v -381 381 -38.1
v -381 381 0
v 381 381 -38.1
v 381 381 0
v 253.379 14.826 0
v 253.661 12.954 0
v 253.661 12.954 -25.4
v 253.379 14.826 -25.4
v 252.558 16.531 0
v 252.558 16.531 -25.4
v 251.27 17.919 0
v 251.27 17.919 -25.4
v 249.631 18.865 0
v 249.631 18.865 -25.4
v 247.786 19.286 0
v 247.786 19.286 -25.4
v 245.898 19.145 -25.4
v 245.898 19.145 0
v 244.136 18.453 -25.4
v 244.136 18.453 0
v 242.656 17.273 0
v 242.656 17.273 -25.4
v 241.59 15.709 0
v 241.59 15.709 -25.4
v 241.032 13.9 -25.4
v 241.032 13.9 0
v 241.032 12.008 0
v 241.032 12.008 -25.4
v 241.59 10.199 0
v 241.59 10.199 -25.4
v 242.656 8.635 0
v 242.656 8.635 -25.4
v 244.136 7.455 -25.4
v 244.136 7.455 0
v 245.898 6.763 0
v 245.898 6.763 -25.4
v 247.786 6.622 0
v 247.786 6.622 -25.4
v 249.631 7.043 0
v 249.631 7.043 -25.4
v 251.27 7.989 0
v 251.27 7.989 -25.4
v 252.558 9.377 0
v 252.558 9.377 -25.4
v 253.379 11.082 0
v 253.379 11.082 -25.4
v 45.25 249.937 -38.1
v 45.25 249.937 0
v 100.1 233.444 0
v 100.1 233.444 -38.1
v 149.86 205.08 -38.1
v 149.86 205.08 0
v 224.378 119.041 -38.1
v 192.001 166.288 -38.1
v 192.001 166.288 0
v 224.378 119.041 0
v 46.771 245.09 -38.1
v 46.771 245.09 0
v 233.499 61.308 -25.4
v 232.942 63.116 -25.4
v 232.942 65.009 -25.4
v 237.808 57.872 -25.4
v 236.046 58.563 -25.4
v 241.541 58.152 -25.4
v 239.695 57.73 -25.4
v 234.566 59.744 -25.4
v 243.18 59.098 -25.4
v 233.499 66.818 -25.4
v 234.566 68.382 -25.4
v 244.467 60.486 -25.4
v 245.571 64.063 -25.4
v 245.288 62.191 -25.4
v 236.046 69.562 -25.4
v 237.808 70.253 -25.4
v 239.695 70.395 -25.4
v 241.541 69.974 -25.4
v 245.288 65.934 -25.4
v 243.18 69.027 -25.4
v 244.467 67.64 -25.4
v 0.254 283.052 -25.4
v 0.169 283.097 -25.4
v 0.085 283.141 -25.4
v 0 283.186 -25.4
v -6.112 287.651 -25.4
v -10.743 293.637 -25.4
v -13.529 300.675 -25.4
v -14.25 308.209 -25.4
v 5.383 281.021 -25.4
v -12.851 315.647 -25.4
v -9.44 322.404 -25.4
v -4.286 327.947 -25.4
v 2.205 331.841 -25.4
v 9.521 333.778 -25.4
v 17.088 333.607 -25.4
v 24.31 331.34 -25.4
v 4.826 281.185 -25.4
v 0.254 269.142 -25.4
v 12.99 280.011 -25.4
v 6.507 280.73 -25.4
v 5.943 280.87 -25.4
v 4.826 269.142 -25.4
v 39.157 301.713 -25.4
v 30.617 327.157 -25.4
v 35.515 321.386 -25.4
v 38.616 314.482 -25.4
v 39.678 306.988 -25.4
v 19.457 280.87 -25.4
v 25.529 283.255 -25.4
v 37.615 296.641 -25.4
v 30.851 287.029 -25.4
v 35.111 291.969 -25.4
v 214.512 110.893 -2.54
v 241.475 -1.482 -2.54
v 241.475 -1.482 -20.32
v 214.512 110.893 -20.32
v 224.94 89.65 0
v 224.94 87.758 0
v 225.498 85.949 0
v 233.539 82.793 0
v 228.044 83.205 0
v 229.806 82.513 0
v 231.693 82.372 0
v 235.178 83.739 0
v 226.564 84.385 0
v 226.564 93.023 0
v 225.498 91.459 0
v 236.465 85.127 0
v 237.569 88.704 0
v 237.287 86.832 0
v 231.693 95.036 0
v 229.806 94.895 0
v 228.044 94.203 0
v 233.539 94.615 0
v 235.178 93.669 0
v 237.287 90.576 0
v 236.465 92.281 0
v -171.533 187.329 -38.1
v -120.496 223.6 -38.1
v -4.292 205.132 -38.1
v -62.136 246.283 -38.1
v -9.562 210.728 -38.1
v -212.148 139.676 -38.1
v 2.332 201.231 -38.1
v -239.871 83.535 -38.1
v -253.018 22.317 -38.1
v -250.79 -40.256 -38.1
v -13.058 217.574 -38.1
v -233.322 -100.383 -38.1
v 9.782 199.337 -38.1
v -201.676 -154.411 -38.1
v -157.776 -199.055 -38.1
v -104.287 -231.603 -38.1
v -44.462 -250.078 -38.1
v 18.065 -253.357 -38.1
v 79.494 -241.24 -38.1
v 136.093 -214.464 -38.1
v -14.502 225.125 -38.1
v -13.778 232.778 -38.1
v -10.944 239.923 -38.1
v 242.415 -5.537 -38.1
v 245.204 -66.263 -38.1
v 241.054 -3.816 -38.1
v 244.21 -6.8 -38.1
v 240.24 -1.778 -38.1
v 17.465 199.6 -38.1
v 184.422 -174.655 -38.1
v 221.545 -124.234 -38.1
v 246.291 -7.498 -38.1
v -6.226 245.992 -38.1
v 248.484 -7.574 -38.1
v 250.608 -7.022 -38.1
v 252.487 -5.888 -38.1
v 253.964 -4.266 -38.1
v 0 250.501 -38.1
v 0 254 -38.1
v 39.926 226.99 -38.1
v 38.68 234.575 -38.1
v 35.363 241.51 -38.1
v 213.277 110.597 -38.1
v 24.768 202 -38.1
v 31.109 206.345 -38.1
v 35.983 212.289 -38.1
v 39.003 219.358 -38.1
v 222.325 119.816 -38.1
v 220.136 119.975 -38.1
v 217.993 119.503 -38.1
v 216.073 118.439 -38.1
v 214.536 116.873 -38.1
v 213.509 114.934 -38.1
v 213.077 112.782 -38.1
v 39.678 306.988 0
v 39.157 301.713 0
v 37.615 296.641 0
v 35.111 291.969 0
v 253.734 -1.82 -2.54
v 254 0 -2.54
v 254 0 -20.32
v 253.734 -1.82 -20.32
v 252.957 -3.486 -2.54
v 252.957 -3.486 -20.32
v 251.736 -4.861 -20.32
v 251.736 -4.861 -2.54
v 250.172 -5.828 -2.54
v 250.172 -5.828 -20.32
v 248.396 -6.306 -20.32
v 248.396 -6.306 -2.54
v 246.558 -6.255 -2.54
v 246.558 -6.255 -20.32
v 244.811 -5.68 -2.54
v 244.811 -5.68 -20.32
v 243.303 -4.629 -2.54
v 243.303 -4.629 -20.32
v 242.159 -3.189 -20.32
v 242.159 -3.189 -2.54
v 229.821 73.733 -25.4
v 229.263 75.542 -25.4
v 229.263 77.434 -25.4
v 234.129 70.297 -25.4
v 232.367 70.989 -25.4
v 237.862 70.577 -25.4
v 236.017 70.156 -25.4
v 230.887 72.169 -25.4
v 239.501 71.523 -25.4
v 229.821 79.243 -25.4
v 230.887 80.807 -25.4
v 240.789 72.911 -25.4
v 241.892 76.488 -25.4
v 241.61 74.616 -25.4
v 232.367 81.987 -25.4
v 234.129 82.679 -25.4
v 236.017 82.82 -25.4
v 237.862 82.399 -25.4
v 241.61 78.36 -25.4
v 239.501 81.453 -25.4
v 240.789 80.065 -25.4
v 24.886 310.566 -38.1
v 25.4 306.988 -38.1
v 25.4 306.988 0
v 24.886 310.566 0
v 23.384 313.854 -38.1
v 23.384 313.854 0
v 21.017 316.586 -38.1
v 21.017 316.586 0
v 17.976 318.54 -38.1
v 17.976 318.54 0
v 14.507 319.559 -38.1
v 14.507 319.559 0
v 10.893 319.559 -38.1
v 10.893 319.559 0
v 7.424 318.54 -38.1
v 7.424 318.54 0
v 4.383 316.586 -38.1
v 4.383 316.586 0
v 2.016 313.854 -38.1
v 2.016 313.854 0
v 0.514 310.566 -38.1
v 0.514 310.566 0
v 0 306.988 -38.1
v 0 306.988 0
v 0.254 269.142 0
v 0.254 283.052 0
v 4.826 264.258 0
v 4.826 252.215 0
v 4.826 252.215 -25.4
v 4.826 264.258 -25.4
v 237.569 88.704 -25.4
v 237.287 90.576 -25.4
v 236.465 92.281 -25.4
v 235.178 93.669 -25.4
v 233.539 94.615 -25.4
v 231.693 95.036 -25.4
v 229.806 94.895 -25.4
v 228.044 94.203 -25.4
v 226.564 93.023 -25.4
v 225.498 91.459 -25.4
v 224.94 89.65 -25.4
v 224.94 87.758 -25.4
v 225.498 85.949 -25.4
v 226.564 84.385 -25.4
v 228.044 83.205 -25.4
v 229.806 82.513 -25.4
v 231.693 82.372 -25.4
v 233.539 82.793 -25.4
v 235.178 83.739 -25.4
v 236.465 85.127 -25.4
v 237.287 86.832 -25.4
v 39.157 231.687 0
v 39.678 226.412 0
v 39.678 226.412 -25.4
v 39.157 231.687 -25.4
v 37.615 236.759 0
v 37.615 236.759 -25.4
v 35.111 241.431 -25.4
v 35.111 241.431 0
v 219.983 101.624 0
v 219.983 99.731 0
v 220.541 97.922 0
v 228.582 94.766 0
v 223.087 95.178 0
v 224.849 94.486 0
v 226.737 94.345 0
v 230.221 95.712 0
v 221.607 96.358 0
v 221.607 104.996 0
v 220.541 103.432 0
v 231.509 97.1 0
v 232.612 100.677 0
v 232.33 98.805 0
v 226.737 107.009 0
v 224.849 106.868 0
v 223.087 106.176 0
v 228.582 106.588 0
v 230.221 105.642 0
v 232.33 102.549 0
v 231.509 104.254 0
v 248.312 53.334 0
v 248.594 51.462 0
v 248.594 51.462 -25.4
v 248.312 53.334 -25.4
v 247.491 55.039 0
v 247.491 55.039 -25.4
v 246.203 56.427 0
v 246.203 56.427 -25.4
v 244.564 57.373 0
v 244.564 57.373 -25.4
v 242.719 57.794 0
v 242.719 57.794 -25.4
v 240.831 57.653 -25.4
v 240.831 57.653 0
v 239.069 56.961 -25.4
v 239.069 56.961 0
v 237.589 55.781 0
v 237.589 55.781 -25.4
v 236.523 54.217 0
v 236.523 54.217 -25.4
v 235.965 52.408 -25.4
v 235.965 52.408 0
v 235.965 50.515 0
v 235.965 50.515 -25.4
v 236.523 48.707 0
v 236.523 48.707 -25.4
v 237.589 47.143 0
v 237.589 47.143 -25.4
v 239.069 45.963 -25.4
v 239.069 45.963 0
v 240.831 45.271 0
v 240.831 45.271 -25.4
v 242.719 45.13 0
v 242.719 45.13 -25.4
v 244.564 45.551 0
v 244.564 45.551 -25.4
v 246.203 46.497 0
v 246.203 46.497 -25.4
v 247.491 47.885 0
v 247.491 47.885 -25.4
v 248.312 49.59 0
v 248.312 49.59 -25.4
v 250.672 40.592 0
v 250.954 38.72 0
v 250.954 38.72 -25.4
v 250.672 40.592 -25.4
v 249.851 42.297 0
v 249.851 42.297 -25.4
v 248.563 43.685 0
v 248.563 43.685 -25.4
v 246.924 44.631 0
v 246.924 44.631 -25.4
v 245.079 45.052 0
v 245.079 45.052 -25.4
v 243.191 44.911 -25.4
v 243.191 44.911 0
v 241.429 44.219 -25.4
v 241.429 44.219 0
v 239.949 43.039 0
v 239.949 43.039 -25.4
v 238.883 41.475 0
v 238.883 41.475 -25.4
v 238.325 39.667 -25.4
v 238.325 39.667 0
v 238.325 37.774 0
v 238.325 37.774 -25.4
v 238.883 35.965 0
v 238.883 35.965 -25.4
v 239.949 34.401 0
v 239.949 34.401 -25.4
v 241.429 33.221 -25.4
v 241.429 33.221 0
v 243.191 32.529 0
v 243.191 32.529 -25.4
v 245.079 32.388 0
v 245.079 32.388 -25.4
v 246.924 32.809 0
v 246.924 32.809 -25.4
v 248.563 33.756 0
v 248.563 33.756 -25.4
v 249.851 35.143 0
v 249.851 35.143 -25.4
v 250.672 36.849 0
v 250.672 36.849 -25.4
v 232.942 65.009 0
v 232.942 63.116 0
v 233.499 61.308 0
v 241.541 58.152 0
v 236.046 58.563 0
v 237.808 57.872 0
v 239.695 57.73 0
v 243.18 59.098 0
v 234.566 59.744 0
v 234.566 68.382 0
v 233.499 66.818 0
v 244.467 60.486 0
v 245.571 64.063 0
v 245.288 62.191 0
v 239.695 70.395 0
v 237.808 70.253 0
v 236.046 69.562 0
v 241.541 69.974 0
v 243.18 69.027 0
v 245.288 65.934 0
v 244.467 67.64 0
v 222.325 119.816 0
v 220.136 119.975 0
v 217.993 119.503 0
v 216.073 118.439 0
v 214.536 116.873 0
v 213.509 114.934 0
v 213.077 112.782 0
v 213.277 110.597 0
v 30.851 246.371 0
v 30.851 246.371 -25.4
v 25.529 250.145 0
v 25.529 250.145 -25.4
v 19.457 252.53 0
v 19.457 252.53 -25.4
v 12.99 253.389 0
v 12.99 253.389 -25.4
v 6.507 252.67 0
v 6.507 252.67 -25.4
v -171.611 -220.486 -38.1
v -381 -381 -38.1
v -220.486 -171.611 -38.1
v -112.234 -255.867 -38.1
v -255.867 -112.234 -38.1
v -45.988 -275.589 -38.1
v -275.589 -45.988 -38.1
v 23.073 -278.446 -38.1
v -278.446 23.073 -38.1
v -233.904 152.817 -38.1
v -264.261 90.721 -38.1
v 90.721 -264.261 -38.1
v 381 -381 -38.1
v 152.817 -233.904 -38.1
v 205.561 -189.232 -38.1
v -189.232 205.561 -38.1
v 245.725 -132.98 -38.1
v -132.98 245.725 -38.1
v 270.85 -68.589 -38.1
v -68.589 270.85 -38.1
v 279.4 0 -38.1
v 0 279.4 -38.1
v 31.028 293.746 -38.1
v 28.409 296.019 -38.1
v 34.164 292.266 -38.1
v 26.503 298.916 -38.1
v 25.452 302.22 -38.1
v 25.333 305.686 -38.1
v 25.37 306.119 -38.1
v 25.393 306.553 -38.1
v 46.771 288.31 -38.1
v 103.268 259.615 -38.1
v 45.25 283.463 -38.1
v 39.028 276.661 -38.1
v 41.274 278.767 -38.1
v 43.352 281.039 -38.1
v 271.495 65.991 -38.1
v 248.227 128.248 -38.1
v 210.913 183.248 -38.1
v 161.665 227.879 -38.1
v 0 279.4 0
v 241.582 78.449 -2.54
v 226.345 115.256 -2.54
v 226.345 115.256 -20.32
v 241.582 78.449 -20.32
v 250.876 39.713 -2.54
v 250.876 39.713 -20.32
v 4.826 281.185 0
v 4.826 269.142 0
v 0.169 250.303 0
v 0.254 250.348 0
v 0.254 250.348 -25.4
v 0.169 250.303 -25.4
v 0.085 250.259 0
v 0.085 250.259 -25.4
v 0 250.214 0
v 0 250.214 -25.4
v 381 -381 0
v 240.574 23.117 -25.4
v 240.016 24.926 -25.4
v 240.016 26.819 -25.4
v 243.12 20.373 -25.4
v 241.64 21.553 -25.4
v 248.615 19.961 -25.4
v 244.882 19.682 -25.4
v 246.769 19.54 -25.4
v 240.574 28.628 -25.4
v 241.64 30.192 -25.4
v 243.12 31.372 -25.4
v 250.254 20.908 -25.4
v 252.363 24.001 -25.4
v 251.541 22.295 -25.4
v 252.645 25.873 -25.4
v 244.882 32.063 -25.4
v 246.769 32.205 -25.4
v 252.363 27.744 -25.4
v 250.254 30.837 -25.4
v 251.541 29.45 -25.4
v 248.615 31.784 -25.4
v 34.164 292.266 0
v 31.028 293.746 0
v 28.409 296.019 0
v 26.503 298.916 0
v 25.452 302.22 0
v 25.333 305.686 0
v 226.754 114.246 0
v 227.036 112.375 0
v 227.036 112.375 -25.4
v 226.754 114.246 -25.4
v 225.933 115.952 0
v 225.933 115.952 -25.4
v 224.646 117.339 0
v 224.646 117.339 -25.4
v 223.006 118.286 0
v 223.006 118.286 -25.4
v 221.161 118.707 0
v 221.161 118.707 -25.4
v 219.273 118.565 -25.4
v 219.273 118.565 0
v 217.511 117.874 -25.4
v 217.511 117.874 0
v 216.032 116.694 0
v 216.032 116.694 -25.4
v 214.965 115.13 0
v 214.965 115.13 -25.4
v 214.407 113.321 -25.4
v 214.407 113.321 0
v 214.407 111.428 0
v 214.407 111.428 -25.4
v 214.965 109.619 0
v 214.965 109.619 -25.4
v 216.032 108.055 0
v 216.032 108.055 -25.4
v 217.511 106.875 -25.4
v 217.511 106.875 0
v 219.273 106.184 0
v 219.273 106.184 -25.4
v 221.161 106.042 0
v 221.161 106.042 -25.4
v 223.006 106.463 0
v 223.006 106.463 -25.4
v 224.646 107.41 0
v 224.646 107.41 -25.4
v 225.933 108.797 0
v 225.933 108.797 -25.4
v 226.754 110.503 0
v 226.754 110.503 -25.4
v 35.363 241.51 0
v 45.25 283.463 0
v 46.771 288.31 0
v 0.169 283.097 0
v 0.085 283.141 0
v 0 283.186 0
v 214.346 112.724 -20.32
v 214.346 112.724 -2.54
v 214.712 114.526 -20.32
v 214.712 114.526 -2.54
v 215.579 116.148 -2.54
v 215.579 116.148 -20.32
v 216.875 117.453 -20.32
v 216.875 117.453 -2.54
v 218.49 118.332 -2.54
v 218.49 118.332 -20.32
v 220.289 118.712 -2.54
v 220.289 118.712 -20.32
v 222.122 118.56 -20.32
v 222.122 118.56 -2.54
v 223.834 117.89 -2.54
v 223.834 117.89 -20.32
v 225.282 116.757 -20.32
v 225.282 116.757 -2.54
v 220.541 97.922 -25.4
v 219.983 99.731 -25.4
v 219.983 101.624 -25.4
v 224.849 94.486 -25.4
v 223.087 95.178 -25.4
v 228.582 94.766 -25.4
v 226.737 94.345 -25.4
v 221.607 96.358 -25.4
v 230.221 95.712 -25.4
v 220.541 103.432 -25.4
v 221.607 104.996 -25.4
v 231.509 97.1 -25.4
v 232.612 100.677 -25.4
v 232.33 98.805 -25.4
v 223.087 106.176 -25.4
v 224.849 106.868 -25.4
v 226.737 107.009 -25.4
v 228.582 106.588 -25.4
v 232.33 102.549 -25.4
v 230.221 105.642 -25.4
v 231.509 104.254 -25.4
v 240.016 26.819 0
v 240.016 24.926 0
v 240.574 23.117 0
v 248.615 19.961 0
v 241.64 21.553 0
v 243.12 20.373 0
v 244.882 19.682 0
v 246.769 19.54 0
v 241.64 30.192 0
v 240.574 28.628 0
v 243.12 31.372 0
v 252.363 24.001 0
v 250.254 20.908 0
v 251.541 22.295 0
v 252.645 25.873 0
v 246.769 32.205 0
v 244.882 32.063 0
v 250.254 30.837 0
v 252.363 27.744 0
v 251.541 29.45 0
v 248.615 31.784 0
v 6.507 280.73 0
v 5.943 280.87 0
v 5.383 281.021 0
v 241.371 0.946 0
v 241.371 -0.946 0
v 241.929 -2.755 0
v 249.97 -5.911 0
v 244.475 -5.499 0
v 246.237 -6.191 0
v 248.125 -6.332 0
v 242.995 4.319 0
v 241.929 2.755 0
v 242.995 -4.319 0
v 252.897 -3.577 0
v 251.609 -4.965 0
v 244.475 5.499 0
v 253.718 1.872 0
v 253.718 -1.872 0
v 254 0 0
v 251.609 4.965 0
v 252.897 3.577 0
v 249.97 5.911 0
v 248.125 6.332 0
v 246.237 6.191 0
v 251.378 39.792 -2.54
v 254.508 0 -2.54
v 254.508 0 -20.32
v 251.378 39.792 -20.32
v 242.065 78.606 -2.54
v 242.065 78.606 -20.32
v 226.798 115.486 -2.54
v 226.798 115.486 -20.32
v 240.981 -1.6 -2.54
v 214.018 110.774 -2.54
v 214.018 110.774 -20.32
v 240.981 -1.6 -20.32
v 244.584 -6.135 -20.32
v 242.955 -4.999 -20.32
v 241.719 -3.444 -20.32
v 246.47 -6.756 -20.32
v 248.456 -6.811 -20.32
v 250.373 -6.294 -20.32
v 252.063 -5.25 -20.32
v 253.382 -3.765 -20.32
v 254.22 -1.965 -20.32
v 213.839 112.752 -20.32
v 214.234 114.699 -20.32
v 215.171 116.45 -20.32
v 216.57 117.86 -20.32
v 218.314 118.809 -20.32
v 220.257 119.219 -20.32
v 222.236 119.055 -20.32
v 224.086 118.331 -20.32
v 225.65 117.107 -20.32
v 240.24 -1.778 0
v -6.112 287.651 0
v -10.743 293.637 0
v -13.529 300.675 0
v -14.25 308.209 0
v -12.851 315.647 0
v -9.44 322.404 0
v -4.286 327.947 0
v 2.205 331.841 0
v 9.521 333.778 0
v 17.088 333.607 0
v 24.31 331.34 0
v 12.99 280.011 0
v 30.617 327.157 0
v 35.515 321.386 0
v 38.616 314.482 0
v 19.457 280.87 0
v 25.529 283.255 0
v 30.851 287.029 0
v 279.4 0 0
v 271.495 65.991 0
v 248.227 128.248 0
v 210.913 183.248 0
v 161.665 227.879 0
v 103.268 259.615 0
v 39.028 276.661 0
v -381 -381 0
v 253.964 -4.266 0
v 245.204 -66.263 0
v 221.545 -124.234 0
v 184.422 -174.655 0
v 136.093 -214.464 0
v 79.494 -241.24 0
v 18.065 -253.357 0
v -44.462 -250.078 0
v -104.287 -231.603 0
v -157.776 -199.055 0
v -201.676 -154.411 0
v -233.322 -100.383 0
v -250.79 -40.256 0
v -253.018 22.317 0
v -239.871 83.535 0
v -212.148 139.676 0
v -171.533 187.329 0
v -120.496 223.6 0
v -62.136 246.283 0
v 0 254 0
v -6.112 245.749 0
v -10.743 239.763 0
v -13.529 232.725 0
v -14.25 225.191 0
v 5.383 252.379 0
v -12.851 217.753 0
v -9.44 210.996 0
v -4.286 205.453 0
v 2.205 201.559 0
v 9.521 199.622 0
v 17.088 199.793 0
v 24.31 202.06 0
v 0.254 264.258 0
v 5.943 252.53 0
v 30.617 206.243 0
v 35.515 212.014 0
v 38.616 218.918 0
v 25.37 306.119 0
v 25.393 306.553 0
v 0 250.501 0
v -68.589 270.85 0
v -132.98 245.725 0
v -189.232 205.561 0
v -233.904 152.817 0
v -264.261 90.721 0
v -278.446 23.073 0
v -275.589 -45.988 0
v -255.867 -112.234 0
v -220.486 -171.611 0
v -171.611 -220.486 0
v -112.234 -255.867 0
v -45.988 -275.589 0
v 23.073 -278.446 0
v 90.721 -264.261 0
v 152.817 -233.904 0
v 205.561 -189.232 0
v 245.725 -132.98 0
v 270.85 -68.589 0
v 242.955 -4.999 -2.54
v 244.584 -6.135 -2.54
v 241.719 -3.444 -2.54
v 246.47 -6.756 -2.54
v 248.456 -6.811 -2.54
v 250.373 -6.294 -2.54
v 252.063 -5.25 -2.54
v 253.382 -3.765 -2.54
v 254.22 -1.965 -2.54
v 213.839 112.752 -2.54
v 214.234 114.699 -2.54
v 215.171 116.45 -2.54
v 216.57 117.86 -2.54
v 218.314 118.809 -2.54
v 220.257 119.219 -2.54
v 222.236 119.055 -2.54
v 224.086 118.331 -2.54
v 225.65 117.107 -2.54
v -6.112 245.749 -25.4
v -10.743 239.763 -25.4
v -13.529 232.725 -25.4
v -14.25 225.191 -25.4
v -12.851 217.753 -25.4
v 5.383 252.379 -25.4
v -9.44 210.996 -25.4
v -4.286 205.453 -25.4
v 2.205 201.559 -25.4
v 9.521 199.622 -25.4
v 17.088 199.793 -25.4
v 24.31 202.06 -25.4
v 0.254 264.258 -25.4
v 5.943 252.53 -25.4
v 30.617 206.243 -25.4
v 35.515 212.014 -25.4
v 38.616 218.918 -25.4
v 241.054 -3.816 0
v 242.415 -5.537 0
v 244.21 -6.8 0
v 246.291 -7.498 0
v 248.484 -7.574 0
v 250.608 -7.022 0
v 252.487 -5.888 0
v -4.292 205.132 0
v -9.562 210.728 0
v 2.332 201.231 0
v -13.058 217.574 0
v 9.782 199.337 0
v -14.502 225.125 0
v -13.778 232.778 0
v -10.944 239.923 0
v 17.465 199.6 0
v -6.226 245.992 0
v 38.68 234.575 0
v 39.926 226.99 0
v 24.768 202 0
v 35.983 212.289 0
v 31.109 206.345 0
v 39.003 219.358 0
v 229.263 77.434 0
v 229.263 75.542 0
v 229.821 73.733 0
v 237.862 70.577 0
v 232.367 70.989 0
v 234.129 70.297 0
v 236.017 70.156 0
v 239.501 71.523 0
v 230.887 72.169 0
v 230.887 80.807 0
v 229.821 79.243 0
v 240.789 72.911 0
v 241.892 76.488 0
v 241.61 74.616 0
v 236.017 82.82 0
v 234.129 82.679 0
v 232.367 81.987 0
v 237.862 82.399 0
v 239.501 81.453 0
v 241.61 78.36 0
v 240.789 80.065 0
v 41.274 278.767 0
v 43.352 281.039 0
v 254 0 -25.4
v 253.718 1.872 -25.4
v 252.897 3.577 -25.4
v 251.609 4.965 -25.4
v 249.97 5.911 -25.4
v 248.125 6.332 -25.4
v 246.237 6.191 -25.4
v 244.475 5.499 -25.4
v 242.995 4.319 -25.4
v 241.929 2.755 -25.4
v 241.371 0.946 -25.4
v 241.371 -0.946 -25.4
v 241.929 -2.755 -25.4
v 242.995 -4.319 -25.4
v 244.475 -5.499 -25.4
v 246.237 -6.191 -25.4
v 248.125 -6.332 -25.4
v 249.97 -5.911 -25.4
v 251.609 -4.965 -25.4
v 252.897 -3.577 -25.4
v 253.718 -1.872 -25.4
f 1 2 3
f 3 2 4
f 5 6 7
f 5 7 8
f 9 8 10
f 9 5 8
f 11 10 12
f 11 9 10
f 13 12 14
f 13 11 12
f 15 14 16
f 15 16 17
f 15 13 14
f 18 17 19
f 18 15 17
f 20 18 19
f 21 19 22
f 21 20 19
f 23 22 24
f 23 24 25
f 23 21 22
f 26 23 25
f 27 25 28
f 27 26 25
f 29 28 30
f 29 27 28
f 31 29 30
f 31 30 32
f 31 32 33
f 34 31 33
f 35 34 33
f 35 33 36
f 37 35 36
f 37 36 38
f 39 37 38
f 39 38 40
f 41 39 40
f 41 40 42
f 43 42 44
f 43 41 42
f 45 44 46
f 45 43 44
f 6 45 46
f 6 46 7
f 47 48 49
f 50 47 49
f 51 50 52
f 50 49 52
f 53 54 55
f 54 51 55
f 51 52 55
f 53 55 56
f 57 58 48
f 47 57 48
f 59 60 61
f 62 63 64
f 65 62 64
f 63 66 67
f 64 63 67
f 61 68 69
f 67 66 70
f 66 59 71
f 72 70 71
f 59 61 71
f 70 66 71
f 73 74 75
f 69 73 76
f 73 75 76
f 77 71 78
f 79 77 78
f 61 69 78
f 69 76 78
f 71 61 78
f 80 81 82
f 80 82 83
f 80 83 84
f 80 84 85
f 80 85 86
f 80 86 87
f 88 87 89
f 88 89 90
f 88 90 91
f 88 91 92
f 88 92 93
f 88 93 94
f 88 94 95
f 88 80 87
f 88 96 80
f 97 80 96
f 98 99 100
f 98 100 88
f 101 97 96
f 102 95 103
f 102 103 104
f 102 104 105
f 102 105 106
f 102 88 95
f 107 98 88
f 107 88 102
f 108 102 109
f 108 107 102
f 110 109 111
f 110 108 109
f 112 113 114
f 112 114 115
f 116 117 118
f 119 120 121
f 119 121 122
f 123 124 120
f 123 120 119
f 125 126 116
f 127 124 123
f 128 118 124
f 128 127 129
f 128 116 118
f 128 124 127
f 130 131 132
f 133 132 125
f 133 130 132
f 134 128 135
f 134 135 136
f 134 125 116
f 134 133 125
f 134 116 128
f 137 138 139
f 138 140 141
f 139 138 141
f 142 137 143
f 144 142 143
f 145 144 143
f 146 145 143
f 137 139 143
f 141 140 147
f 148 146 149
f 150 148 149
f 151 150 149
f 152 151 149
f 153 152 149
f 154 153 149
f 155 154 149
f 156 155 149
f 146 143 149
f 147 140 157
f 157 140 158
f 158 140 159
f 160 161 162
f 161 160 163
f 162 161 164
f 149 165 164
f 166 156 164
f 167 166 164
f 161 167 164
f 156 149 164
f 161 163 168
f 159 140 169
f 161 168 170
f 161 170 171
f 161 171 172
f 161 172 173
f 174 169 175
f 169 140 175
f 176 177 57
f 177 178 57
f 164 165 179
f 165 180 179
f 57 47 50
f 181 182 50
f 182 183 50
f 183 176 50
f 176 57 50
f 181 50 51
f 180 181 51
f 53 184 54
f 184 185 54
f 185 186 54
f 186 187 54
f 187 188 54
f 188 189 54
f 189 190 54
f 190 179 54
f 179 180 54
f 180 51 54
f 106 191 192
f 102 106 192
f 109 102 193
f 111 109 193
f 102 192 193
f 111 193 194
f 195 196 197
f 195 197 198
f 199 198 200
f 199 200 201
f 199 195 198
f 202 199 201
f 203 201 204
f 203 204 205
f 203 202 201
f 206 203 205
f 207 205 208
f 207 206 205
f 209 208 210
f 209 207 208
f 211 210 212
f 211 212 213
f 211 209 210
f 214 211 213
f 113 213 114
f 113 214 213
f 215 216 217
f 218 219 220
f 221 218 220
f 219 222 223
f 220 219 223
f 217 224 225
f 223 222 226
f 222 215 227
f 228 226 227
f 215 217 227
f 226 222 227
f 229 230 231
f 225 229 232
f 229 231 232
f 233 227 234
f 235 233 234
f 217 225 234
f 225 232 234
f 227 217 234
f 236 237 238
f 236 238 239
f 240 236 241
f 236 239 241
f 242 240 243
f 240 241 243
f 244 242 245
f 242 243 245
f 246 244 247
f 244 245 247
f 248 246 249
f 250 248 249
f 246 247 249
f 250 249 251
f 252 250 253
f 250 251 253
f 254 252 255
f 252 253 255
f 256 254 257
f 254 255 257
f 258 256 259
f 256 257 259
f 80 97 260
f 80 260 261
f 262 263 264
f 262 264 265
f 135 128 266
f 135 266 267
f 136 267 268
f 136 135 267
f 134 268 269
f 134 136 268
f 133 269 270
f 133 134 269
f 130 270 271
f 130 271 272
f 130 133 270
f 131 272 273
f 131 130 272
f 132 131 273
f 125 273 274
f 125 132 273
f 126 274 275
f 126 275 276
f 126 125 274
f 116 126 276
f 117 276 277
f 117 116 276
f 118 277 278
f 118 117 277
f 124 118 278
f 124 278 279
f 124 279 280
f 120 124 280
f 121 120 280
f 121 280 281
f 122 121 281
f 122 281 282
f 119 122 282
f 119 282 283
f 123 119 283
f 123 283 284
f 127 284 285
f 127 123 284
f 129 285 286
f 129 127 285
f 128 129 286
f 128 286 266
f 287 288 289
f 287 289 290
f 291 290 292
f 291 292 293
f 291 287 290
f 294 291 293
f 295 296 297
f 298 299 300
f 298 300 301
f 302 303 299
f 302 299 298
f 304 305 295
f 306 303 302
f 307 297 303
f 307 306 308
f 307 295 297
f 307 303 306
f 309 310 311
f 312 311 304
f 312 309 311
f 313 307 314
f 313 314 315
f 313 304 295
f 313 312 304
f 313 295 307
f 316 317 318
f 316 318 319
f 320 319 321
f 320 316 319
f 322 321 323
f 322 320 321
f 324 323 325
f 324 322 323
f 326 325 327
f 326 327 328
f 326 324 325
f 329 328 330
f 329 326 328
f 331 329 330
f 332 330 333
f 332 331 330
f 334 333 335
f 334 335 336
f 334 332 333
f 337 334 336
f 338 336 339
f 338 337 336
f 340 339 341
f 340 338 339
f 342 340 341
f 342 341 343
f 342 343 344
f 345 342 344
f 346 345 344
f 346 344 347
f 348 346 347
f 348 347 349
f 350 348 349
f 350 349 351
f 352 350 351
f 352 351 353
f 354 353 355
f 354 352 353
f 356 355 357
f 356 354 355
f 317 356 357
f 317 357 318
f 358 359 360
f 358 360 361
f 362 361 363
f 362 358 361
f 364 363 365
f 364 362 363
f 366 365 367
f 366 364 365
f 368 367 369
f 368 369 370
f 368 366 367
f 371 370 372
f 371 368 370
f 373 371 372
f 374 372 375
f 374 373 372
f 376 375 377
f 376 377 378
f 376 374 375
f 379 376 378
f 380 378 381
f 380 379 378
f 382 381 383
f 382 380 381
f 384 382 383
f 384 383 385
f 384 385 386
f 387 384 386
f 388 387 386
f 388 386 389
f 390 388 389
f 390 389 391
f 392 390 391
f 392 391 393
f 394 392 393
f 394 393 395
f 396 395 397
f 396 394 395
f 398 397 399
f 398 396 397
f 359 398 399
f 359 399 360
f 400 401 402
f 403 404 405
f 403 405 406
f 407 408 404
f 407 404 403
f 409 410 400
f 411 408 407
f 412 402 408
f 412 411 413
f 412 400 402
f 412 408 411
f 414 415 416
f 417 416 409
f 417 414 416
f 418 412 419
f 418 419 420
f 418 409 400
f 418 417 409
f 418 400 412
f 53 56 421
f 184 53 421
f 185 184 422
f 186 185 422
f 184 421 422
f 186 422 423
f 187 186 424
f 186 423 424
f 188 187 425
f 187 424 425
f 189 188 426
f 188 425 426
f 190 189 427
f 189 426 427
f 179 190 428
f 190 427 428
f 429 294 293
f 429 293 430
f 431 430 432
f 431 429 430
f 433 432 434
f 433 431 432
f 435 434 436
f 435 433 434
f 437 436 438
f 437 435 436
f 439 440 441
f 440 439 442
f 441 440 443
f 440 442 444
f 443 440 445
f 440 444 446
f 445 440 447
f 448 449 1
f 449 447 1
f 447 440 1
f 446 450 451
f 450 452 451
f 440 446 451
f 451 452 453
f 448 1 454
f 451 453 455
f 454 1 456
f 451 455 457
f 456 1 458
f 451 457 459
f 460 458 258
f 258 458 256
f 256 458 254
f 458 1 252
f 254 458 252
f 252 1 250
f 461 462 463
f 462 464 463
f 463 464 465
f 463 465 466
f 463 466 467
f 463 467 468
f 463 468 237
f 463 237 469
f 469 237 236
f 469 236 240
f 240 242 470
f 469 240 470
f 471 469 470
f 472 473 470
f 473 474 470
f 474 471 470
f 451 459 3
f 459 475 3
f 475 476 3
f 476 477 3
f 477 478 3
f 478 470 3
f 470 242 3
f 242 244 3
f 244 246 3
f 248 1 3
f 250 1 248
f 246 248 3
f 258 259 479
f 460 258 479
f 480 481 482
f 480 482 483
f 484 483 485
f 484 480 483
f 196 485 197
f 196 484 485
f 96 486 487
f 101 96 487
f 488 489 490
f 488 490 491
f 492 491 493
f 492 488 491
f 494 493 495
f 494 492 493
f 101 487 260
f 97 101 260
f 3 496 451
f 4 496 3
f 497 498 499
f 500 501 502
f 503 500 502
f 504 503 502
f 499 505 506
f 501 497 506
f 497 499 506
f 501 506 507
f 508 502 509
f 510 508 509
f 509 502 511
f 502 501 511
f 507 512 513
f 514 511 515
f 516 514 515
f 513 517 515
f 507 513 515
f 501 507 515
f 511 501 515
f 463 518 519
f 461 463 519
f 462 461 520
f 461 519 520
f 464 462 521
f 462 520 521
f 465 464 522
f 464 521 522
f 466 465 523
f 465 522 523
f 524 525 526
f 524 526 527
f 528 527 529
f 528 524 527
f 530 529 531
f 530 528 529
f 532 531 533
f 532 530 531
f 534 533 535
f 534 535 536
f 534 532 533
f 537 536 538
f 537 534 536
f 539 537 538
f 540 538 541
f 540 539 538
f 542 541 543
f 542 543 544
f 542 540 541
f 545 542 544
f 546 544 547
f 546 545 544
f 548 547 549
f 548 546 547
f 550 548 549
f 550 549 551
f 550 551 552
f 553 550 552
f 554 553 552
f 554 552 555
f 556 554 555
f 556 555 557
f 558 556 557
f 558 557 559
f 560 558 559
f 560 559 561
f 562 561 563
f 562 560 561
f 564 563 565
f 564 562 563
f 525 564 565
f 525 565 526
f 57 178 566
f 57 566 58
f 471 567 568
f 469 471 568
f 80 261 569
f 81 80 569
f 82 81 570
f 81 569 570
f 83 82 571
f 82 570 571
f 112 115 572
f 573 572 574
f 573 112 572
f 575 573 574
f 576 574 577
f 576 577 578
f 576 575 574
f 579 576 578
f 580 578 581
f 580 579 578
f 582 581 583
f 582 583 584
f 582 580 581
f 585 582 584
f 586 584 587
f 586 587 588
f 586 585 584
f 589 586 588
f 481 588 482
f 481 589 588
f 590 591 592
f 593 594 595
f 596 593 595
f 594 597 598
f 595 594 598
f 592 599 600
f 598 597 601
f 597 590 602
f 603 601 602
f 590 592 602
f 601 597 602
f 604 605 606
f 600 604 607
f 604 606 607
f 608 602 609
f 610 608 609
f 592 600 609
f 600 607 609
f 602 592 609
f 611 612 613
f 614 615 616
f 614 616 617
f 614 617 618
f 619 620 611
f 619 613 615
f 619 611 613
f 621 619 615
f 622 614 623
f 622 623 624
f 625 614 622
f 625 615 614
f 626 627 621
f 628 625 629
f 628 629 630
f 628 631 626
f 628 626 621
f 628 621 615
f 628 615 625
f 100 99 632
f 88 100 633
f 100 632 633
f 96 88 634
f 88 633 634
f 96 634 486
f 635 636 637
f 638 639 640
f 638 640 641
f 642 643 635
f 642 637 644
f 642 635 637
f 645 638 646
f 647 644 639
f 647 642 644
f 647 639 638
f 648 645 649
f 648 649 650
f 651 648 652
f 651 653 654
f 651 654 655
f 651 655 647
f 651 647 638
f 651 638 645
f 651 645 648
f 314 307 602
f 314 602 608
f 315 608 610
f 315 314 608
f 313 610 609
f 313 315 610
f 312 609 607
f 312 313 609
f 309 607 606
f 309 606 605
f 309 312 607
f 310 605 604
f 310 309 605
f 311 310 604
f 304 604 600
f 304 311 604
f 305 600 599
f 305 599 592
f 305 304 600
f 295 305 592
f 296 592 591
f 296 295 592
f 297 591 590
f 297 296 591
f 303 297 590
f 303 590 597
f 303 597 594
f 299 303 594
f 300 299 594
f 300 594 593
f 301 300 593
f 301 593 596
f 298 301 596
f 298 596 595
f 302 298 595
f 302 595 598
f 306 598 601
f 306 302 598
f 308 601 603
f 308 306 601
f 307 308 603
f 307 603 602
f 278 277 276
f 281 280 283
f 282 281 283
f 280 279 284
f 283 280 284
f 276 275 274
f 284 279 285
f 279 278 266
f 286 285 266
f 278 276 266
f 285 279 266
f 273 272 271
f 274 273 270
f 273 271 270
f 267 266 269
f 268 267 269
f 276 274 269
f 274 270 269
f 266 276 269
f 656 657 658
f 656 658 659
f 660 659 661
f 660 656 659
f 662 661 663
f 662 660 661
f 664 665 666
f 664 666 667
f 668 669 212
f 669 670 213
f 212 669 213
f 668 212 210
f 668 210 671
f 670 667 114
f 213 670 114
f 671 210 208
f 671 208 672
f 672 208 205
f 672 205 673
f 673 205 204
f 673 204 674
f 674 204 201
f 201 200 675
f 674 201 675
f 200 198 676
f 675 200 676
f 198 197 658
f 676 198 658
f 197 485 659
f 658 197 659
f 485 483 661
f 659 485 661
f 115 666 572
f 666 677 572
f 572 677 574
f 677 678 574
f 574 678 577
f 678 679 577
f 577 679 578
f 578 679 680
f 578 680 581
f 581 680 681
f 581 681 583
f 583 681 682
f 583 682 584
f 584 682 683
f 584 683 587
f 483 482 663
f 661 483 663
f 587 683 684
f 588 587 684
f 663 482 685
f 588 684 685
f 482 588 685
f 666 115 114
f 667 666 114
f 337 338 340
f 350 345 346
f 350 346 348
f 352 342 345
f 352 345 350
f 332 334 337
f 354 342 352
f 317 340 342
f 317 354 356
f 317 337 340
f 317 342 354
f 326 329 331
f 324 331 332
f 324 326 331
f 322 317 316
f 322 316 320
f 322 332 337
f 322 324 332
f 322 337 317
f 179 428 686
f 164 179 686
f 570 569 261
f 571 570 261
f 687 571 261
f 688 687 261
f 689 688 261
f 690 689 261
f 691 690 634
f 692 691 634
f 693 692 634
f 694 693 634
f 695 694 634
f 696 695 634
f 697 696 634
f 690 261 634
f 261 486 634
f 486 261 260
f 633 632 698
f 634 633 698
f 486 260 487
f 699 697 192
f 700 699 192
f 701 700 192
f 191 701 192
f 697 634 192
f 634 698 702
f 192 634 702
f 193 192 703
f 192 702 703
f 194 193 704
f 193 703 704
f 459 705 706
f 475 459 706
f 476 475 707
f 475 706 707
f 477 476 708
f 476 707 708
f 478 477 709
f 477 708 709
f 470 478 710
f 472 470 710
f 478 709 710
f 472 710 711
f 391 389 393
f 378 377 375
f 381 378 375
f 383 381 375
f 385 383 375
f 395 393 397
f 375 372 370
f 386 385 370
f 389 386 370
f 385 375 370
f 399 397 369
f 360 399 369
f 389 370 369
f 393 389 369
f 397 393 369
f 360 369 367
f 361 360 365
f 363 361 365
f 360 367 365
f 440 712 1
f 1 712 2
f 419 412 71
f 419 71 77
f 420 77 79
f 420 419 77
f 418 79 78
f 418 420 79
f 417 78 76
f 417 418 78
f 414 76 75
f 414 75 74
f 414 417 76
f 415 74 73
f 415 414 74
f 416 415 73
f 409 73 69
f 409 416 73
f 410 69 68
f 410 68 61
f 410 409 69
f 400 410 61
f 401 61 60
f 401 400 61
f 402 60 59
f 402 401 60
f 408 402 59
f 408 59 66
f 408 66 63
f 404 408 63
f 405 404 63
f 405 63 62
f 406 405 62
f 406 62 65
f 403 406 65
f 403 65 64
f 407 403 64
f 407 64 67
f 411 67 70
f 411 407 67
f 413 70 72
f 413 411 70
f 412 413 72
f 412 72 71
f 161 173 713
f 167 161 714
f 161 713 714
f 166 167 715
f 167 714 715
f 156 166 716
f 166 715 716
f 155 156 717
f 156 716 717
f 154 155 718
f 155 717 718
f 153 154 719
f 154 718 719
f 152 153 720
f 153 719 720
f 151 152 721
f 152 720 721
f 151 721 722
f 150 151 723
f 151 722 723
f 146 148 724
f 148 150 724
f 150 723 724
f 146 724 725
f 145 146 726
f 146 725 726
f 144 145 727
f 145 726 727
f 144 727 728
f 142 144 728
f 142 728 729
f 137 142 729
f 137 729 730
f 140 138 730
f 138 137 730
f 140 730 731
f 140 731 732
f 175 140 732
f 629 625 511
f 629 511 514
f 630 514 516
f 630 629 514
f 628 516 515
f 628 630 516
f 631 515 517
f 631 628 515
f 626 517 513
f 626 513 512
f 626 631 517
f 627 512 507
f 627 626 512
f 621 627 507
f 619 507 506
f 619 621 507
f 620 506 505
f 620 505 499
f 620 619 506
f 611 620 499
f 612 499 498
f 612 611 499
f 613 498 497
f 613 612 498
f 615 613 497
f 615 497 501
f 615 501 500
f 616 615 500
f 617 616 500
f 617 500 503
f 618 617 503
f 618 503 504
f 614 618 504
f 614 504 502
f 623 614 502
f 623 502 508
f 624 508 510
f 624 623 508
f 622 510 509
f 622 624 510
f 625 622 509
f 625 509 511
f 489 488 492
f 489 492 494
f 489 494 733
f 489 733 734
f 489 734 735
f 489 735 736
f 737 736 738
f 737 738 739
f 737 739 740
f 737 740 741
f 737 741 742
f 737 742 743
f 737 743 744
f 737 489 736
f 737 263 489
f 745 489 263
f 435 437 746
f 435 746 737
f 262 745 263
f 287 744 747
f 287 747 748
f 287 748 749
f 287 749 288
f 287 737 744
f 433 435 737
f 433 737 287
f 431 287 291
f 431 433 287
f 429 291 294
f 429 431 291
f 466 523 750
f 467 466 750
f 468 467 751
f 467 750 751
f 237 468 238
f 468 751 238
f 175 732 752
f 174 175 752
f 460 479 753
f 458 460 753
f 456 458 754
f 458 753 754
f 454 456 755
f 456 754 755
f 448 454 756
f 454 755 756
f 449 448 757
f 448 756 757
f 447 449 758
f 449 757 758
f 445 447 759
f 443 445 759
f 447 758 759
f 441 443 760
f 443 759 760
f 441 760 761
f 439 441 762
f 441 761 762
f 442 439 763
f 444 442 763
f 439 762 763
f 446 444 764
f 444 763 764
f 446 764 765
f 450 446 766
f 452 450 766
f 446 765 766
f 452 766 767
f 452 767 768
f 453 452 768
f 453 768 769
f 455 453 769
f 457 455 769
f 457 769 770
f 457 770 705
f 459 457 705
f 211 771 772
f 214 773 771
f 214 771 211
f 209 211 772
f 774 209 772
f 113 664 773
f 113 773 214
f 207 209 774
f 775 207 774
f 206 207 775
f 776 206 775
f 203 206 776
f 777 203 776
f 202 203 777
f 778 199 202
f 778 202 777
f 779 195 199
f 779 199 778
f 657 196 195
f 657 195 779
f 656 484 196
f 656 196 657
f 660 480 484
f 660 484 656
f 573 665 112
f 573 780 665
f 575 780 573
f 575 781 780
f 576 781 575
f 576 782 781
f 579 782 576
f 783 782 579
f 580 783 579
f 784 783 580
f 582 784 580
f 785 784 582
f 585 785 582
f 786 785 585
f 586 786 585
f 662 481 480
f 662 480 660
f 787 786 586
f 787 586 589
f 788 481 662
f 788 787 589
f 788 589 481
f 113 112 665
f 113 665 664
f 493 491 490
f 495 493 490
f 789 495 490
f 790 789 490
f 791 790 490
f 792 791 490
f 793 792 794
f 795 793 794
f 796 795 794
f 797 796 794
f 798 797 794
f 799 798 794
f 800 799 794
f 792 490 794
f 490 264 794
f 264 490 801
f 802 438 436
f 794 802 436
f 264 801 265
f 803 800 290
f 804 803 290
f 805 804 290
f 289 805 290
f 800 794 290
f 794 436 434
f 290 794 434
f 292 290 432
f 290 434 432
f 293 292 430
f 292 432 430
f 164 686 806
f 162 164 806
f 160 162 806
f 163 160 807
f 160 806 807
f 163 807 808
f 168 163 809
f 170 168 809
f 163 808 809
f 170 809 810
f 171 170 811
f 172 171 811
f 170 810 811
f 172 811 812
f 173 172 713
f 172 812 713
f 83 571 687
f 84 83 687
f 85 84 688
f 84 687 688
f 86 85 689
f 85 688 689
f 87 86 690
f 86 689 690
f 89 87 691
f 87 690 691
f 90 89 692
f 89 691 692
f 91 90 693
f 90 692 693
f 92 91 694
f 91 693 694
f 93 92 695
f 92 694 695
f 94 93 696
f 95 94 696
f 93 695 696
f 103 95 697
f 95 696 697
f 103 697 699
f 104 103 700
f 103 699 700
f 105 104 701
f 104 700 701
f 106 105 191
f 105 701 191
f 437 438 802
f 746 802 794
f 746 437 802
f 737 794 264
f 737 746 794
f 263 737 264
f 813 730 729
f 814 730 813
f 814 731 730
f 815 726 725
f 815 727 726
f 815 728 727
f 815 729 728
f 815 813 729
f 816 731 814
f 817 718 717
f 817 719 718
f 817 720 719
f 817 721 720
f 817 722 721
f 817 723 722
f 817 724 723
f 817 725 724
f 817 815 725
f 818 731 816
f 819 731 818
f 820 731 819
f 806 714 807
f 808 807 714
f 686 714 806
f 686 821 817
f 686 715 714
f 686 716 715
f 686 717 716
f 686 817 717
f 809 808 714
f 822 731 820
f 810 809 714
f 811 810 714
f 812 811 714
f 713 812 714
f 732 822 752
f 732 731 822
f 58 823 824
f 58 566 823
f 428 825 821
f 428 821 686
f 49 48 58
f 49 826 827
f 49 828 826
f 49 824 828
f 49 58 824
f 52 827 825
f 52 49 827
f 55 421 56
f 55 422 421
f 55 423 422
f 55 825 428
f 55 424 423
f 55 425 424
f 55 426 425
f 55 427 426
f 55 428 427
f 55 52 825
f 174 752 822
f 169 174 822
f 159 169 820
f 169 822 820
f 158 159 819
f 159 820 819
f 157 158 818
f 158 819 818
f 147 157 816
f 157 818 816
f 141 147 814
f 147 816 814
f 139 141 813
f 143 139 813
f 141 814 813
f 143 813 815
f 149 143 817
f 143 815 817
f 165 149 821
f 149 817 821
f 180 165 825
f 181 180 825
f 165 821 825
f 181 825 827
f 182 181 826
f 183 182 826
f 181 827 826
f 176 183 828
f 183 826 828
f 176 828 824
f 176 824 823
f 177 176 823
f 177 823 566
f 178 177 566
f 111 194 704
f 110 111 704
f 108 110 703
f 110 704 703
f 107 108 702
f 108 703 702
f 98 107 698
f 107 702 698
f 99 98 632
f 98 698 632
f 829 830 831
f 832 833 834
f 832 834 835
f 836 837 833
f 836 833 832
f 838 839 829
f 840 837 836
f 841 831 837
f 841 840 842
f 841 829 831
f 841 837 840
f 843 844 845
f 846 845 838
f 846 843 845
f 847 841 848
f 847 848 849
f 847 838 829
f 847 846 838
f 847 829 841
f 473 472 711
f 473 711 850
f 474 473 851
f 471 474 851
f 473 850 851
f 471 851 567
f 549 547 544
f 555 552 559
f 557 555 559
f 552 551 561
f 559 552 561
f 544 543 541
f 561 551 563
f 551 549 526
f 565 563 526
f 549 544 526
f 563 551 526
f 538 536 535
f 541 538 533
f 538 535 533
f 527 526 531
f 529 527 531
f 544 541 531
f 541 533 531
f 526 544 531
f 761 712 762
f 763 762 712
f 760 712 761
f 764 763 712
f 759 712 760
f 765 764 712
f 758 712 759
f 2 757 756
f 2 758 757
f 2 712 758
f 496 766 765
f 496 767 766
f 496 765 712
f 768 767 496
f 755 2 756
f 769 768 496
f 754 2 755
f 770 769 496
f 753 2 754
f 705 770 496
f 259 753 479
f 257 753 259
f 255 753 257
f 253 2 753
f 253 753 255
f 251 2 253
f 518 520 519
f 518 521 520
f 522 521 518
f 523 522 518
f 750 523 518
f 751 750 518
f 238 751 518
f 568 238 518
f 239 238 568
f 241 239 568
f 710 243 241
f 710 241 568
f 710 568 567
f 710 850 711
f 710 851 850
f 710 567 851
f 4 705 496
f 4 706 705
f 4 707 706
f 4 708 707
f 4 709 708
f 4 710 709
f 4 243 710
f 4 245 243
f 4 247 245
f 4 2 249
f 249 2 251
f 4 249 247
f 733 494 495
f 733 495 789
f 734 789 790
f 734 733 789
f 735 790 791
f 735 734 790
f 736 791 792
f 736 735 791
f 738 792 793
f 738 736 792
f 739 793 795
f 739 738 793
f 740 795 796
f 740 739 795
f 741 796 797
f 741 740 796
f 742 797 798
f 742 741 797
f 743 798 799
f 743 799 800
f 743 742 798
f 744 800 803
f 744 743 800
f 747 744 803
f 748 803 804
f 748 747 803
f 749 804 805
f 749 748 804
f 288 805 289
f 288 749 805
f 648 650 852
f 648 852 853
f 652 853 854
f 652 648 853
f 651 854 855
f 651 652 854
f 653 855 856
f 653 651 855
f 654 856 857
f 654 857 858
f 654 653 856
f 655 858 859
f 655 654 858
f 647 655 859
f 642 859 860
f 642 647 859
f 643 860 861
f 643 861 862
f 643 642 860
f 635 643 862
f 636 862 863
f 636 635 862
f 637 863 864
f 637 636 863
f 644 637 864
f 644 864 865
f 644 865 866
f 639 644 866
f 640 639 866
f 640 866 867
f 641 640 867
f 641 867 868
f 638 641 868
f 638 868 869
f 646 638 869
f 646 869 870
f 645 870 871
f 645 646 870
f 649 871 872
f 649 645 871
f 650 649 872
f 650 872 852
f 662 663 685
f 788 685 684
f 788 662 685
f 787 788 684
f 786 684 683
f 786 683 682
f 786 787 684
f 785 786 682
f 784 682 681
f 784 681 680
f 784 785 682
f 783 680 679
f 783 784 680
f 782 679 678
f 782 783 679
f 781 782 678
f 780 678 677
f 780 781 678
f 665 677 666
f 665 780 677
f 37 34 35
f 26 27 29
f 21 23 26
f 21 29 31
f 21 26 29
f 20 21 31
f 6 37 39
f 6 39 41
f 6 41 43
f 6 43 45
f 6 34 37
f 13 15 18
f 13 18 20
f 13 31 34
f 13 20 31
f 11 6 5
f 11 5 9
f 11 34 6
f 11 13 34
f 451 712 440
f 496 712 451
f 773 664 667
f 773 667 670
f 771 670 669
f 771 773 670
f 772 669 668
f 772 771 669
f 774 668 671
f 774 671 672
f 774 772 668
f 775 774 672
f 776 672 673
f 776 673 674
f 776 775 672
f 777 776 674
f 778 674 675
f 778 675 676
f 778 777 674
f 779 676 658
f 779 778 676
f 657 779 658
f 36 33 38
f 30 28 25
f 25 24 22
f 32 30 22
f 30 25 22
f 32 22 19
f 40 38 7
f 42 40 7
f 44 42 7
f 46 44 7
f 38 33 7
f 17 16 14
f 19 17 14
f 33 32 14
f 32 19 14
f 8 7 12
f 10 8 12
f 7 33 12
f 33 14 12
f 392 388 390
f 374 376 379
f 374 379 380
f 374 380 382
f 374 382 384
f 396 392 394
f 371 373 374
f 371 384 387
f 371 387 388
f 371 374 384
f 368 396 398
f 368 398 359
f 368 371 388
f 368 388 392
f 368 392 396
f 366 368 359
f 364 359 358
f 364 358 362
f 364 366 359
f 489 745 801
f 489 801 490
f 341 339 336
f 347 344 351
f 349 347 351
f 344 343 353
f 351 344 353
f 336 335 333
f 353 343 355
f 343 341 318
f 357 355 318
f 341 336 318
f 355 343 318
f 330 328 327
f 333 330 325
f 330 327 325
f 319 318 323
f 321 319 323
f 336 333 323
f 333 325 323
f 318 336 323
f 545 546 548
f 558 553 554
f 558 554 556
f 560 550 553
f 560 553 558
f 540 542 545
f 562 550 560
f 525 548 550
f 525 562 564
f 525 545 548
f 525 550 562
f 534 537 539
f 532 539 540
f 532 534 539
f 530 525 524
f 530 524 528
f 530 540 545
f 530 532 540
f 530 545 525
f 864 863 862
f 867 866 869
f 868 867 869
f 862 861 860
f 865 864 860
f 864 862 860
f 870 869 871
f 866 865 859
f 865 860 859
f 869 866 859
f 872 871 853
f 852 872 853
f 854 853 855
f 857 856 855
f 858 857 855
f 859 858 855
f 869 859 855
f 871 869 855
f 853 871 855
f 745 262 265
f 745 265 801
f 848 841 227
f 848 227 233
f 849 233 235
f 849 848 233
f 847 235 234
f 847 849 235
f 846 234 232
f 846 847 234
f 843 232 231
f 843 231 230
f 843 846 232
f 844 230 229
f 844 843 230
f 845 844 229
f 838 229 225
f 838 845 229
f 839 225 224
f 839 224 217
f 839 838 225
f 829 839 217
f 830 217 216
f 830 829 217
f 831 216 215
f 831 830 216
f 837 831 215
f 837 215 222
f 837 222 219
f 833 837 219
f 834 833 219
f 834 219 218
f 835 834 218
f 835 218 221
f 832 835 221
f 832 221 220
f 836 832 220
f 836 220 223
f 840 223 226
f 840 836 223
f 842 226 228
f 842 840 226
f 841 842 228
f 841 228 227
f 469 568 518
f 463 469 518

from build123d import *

# Parameters (mm, degrees)
F0_W      = 762
F0_H      = 762
F1_DEPTH  = 38.1
F2_R      = 279.4
F3_DEPTH  = 38.101
F5_DEPTH  = 38.101
F7_START  = -2.54
F7_DEPTH  = 17.78
F8_R      = 6.35
F9_DEPTH  = 25.4
F11_DEPTH = 38.1
F14_DEPTH = 25.4


# Not quite as in the source:
# - a feature of the source that left no trace in its solid (it failed there, or was rolled back) is left out


with BuildPart() as f1:
    # F0 (on Top) → F1 (new body)
    with BuildSketch(Plane.XY):
        Rectangle(F0_W, F0_H)
    extrude(amount=-F1_DEPTH)

    # F2 (on face) → F3 (cut, through all)
    with BuildSketch(Plane.XY):
        Circle(F2_R)
        with BuildLine():
            ThreePointArc((224.3775185155, 119.0408719088), (246.4831532813, 61.3355944662), (254, 0))
            ThreePointArc((254, 0), (253.9910447139, -2.1328865718), (253.9641794872, -4.2656227451))
            ThreePointArc((253.9641794872, -4.2656227451), (-246.9895097327, -59.2636657828), (224.3775185155, 119.0408719088))
        make_face(mode=Mode.SUBTRACT)
    extrude(amount=-F3_DEPTH, mode=Mode.SUBTRACT)

    # F4 (on face) → F5 (cut, through all)
    with BuildSketch(Plane.XY):
        with BuildLine():
            ThreePointArc((224.3775185155, 119.0408719088), (216.0730202223, 118.4392832877), (213.2767121099, 110.5966267409))
            Line((213.2767121099, 110.5966267409), (240.240314708, -1.7779099735))
            ThreePointArc((240.240314708, -1.7779099735), (246.2908782429, -7.4978122175), (253.9641794872, -4.2656227451))
            ThreePointArc((253.9641794872, -4.2656227451), (246.9895097327, 59.2636657828), (224.3775185155, 119.0408719088))
        make_face()
    extrude(amount=-F5_DEPTH, mode=Mode.SUBTRACT)

    # F10 (on face) → F11 (cut, through all)
    with BuildSketch(Plane.XY):
        with BuildLine():
            Line((5.08, 264.5120737159), (0, 264.5120737159))
            Line((0, 264.5120737159), (0, 250.501342462))
            Line((0, 250.501342462), (0, 226.4120737159))
            ThreePointArc((0, 226.4120737159), (2.4632622422, 233.9286686948), (8.8975118233, 238.5294613743))
            Line((8.8975118233, 238.5294613743), (12.615777201, 239.6962689846))
            ThreePointArc((12.615777201, 239.6962689846), (7.1292810208, 244.38136211), (5.08, 251.2988895025))
            Line((5.08, 251.2988895025), (5.08, 264.5120737159))
        make_face()
        with BuildLine():
            ThreePointArc((45.2496747987, 249.9369259045), (25.0130471791, 264.6388819683), (0, 264.5120737159))
            Line((0, 264.5120737159), (5.08, 264.5120737159))
            Line((5.08, 264.5120737159), (5.08, 251.2988895025))
            ThreePointArc((5.08, 251.2988895025), (7.1292810208, 244.38136211), (12.615777201, 239.6962689846))
            Line((12.615777201, 239.6962689846), (45.2496747987, 249.9369259045))
        make_face()
        with BuildLine():
            Line((0, 226.4120737159), (0, 250.501342462))
            ThreePointArc((0, 250.501342462), (5.9898062687, 200.019723142), (35.3633290174, 241.5102983325))
            Line((35.3633290174, 241.5102983325), (34.163640517, 241.1338309397))
            ThreePointArc((34.163640517, 241.1338309397), (27.3570251588, 235.9976267185), (25.3330643469, 227.7142584986))
            ThreePointArc((25.3330643469, 227.7142584986), (25.3832550476, 227.064025706), (25.4, 226.4120737159))
            ThreePointArc((25.4, 226.4120737159), (12.7, 213.7120737159), (0, 226.4120737159))
        make_face()
        with BuildLine():
            Line((46.7706700694, 245.0899708412), (45.2496747987, 249.9369259045))
            Line((45.2496747987, 249.9369259045), (12.615777201, 239.6962689846))
            ThreePointArc((12.615777201, 239.6962689846), (13.9050170211, 239.2044896864), (15.24, 238.8554816092))
            ThreePointArc((15.24, 238.8554816092), (22.1120764722, 234.938668375), (25.3330643469, 227.7142584986))
            ThreePointArc((25.3330643469, 227.7142584986), (27.3570251588, 235.9976267185), (34.163640517, 241.1338309397))
            Line((34.163640517, 241.1338309397), (35.3633290174, 241.5102983325))
            Line((35.3633290174, 241.5102983325), (46.7706700694, 245.0899708412))
        make_face()
        with BuildLine():
            Line((0, 306.9879262841), (0, 268.8879262841))
            ThreePointArc((0, 268.8879262841), (25.0130471791, 268.7611180317), (45.2496747987, 283.4630740955))
            Line((45.2496747987, 283.4630740955), (46.7706700694, 288.3100291588))
            Line((46.7706700694, 288.3100291588), (34.163640517, 292.2661690603))
            ThreePointArc((34.163640517, 292.2661690603), (27.3570251588, 297.4023732815), (25.3330643469, 305.6857415014))
            ThreePointArc((25.3330643469, 305.6857415014), (12.0480480098, 294.3046712365), (0, 306.9879262841))
        make_face()
        with BuildLine():
            ThreePointArc((25.4, 306.9879262841), (12.7, 319.6879262841), (0, 306.9879262841))
            ThreePointArc((0, 306.9879262841), (12.0480480098, 294.3046712365), (25.3330643469, 305.6857415014))
            ThreePointArc((25.3330643469, 305.6857415014), (25.3832550476, 306.335974294), (25.4, 306.9879262841))
        make_face()
        with BuildLine():
            ThreePointArc((15.24, 238.8554816092), (13.9050170211, 239.2044896864), (12.615777201, 239.6962689846))
            Line((12.615777201, 239.6962689846), (8.8975118233, 238.5294613743))
            ThreePointArc((8.8975118233, 238.5294613743), (12.0480480098, 239.0953287635), (15.24, 238.8554816092))
        make_face()
        with BuildLine():
            ThreePointArc((8.8975118233, 238.5294613743), (2.4632622422, 233.9286686948), (0, 226.4120737159))
            ThreePointArc((0, 226.4120737159), (12.7, 213.7120737159), (25.4, 226.4120737159))
            ThreePointArc((25.4, 226.4120737159), (25.3832550476, 227.064025706), (25.3330643469, 227.7142584986))
            ThreePointArc((25.3330643469, 227.7142584986), (22.1120764722, 234.938668375), (15.24, 238.8554816092))
            ThreePointArc((15.24, 238.8554816092), (12.0480480098, 239.0953287635), (8.8975118233, 238.5294613743))
        make_face()
    extrude(amount=-F11_DEPTH, mode=Mode.SUBTRACT)


with BuildPart() as f7:
    # F6 (on face) → F7 (new body)
    with BuildSketch(Plane.XY.offset(F7_START)):
        with BuildLine():
            Line((214.0176806391, 110.7744177383), (240.9812832372, -1.6001189761))
            ThreePointArc((240.9812832372, -1.6001189761), (248.4556377725, -6.8105147955), (254.508, 0))
            ThreePointArc((254.508, 0), (247.4834887521, 59.3821931143), (226.7977130223, 115.4864469619))
            ThreePointArc((226.7977130223, 115.4864469619), (218.3139558622, 118.8091062525), (214.0176806391, 110.7744177383))
        make_face()
        with BuildLine():
            ThreePointArc((254, 0), (248.3959609004, -6.306032218), (241.4752622567, -1.4815916446))
            Line((241.4752622567, -1.4815916446), (214.5116596586, 110.8929450698))
            ThreePointArc((214.5116596586, 110.8929450698), (218.4896922725, 118.3324714719), (226.3450229763, 115.2559350917))
            ThreePointArc((226.3450229763, 115.2559350917), (246.9895097327, 59.2636657828), (254, 0))
        make_face(mode=Mode.SUBTRACT)
    extrude(amount=-F7_DEPTH)


with BuildPart() as f9:
    # F8 (on face) → F9 (new body)
    with BuildSketch(Plane.XY):
        with Locations((247.65, 0)):
            Circle(F8_R)
    extrude(amount=-F9_DEPTH)


with BuildPart() as f9b:
    # F8 (on face) → F9, piece 2 (new body)
    with BuildSketch(Plane.XY):
        with Locations((247.3109710142, 12.954)):
            Circle(F8_R)
    extrude(amount=-F9_DEPTH)


with BuildPart() as f9c:
    # F8 (on face) → F9, piece 3 (new body)
    with BuildSketch(Plane.XY):
        with Locations((246.2948123077, 25.8725323523)):
            Circle(F8_R)
    extrude(amount=-F9_DEPTH)


with BuildPart() as f9d:
    # F8 (on face) → F9, piece 4 (new body)
    with BuildSketch(Plane.XY):
        with Locations((244.6043060912, 38.7202265183)):
            Circle(F8_R)
    extrude(amount=-F9_DEPTH)


with BuildPart() as f9e:
    # F8 (on face) → F9, piece 5 (new body)
    with BuildSketch(Plane.XY):
        with Locations((242.2440809181, 51.4619059126)):
            Circle(F8_R)
    extrude(amount=-F9_DEPTH)


with BuildPart() as f9f:
    # F8 (on face) → F9, piece 6 (new body)
    with BuildSketch(Plane.XY):
        with Locations((239.2205990111, 64.0626842144)):
            Circle(F8_R)
    extrude(amount=-F9_DEPTH)


with BuildPart() as f9g:
    # F8 (on face) → F9, piece 7 (new body)
    with BuildSketch(Plane.XY):
        with Locations((235.5421385695, 76.488060886)):
            Circle(F8_R)
    extrude(amount=-F9_DEPTH)


with BuildPart() as f9h:
    # F8 (on face) → F9, piece 8 (new body)
    with BuildSketch(Plane.XY):
        with Locations((231.2187711031, 88.704015634)):
            Circle(F8_R)
    extrude(amount=-F9_DEPTH)


with BuildPart() as f9i:
    # F8 (on face) → F9, piece 9 (new body)
    with BuildSketch(Plane.XY):
        with Locations((226.262333857, 100.6771015553)):
            Circle(F8_R)
    extrude(amount=-F9_DEPTH)


with BuildPart() as f9j:
    # F8 (on face) → F9, piece 10 (new body)
    with BuildSketch(Plane.XY):
        with Locations((220.6863974019, 112.3745367144)):
            Circle(F8_R)
    extrude(amount=-F9_DEPTH)


with BuildPart() as f14:
    # F13 (on face) → F14 (new body)
    with BuildSketch(Plane.XY):
        with BuildLine():
            Line((4.826, 254), (4.826, 264.2580737159))
            Line((4.826, 264.2580737159), (0.254, 264.2580737159))
            Line((0.254, 264.2580737159), (0.254, 250.3476247431))
            ThreePointArc((0.254, 250.3476247431), (2.4971679316, 251.3863752429), (4.826, 252.2154386704))
            Line((4.826, 252.2154386704), (4.826, 254))
        make_face()
        with BuildLine():
            ThreePointArc((4.826, 252.2154386704), (2.4971679316, 251.3863752429), (0.254, 250.3476247431))
            Line((0.254, 250.3476247431), (0.254, 226.4120737159))
            ThreePointArc((0.254, 226.4120737159), (13.3389129504, 213.9824837692), (25.0804030599, 227.6882148029))
            ThreePointArc((25.0804030599, 227.6882148029), (21.9238349428, 234.7681364818), (15.1892, 238.6066134513))
            ThreePointArc((15.1892, 238.6066134513), (13.8275173615, 238.9626016901), (12.512492745, 239.4642165743))
            ThreePointArc((12.512492745, 239.4642165743), (6.9162666412, 244.2430115622), (4.826, 251.2988895025))
            Line((4.826, 251.2988895025), (4.826, 252.2154386704))
        make_face()
        with BuildLine():
            Line((0, 226.4120737159), (0, 250.2138282516))
            ThreePointArc((0, 250.2138282516), (-1.1779082604, 203.2773123967), (39.6780191819, 226.4120737159))
            ThreePointArc((39.6780191819, 226.4120737159), (38.5109706705, 234.2611062693), (35.1107963914, 241.4310525122))
            Line((35.1107963914, 241.4310525122), (34.163640517, 241.1338309397))
            ThreePointArc((34.163640517, 241.1338309397), (27.3570251588, 235.9976267185), (25.3330643469, 227.7142584986))
            ThreePointArc((25.3330643469, 227.7142584986), (25.3832550476, 227.064025706), (25.4, 226.4120737159))
            ThreePointArc((25.4, 226.4120737159), (12.7, 213.7120737159), (0, 226.4120737159))
        make_face()
        with BuildLine():
            Line((0.254, 226.4120737159), (0.254, 250.3476247431))
            ThreePointArc((0.254, 250.3476247431), (0.1268220256, 250.2810643649), (0, 250.2138282516))
            Line((0, 250.2138282516), (0, 226.4120737159))
            ThreePointArc((0, 226.4120737159), (12.7, 213.7120737159), (25.4, 226.4120737159))
            ThreePointArc((25.4, 226.4120737159), (25.3832550476, 227.064025706), (25.3330643469, 227.7142584986))
            ThreePointArc((25.3330643469, 227.7142584986), (27.3570251588, 235.9976267185), (34.163640517, 241.1338309397))
            Line((34.163640517, 241.1338309397), (35.1107963914, 241.4310525122))
            ThreePointArc((35.1107963914, 241.4310525122), (22.565502396, 251.5215416802), (6.5067237427, 252.6695840354))
            ThreePointArc((6.5067237427, 252.6695840354), (5.6626974395, 252.4560728644), (4.826, 252.2154386704))
            Line((4.826, 252.2154386704), (4.826, 251.2988895025))
            ThreePointArc((4.826, 251.2988895025), (6.9162666412, 244.2430115622), (12.512492745, 239.4642165743))
            ThreePointArc((12.512492745, 239.4642165743), (13.8275173615, 238.9626016901), (15.1892, 238.6066134513))
            ThreePointArc((15.1892, 238.6066134513), (21.9238349428, 234.7681364818), (25.0804030599, 227.6882148029))
            ThreePointArc((25.0804030599, 227.6882148029), (13.3389129504, 213.9824837692), (0.254, 226.4120737159))
        make_face()
    extrude(amount=-F14_DEPTH)


with BuildPart() as f16_1:
    # F16: instance of F14
    add(f14.part.mirror(Plane(origin=(0, 266.7, 0), x_dir=(-1, 0, 0), z_dir=(0, 1, 0))))


solid = Compound([f1.part, f7.part, f9.part, f9b.part, f9c.part, f9d.part, f9e.part, f9f.part, f9g.part, f9h.part, f9i.part, f9j.part, f14.part, f16_1.part])
